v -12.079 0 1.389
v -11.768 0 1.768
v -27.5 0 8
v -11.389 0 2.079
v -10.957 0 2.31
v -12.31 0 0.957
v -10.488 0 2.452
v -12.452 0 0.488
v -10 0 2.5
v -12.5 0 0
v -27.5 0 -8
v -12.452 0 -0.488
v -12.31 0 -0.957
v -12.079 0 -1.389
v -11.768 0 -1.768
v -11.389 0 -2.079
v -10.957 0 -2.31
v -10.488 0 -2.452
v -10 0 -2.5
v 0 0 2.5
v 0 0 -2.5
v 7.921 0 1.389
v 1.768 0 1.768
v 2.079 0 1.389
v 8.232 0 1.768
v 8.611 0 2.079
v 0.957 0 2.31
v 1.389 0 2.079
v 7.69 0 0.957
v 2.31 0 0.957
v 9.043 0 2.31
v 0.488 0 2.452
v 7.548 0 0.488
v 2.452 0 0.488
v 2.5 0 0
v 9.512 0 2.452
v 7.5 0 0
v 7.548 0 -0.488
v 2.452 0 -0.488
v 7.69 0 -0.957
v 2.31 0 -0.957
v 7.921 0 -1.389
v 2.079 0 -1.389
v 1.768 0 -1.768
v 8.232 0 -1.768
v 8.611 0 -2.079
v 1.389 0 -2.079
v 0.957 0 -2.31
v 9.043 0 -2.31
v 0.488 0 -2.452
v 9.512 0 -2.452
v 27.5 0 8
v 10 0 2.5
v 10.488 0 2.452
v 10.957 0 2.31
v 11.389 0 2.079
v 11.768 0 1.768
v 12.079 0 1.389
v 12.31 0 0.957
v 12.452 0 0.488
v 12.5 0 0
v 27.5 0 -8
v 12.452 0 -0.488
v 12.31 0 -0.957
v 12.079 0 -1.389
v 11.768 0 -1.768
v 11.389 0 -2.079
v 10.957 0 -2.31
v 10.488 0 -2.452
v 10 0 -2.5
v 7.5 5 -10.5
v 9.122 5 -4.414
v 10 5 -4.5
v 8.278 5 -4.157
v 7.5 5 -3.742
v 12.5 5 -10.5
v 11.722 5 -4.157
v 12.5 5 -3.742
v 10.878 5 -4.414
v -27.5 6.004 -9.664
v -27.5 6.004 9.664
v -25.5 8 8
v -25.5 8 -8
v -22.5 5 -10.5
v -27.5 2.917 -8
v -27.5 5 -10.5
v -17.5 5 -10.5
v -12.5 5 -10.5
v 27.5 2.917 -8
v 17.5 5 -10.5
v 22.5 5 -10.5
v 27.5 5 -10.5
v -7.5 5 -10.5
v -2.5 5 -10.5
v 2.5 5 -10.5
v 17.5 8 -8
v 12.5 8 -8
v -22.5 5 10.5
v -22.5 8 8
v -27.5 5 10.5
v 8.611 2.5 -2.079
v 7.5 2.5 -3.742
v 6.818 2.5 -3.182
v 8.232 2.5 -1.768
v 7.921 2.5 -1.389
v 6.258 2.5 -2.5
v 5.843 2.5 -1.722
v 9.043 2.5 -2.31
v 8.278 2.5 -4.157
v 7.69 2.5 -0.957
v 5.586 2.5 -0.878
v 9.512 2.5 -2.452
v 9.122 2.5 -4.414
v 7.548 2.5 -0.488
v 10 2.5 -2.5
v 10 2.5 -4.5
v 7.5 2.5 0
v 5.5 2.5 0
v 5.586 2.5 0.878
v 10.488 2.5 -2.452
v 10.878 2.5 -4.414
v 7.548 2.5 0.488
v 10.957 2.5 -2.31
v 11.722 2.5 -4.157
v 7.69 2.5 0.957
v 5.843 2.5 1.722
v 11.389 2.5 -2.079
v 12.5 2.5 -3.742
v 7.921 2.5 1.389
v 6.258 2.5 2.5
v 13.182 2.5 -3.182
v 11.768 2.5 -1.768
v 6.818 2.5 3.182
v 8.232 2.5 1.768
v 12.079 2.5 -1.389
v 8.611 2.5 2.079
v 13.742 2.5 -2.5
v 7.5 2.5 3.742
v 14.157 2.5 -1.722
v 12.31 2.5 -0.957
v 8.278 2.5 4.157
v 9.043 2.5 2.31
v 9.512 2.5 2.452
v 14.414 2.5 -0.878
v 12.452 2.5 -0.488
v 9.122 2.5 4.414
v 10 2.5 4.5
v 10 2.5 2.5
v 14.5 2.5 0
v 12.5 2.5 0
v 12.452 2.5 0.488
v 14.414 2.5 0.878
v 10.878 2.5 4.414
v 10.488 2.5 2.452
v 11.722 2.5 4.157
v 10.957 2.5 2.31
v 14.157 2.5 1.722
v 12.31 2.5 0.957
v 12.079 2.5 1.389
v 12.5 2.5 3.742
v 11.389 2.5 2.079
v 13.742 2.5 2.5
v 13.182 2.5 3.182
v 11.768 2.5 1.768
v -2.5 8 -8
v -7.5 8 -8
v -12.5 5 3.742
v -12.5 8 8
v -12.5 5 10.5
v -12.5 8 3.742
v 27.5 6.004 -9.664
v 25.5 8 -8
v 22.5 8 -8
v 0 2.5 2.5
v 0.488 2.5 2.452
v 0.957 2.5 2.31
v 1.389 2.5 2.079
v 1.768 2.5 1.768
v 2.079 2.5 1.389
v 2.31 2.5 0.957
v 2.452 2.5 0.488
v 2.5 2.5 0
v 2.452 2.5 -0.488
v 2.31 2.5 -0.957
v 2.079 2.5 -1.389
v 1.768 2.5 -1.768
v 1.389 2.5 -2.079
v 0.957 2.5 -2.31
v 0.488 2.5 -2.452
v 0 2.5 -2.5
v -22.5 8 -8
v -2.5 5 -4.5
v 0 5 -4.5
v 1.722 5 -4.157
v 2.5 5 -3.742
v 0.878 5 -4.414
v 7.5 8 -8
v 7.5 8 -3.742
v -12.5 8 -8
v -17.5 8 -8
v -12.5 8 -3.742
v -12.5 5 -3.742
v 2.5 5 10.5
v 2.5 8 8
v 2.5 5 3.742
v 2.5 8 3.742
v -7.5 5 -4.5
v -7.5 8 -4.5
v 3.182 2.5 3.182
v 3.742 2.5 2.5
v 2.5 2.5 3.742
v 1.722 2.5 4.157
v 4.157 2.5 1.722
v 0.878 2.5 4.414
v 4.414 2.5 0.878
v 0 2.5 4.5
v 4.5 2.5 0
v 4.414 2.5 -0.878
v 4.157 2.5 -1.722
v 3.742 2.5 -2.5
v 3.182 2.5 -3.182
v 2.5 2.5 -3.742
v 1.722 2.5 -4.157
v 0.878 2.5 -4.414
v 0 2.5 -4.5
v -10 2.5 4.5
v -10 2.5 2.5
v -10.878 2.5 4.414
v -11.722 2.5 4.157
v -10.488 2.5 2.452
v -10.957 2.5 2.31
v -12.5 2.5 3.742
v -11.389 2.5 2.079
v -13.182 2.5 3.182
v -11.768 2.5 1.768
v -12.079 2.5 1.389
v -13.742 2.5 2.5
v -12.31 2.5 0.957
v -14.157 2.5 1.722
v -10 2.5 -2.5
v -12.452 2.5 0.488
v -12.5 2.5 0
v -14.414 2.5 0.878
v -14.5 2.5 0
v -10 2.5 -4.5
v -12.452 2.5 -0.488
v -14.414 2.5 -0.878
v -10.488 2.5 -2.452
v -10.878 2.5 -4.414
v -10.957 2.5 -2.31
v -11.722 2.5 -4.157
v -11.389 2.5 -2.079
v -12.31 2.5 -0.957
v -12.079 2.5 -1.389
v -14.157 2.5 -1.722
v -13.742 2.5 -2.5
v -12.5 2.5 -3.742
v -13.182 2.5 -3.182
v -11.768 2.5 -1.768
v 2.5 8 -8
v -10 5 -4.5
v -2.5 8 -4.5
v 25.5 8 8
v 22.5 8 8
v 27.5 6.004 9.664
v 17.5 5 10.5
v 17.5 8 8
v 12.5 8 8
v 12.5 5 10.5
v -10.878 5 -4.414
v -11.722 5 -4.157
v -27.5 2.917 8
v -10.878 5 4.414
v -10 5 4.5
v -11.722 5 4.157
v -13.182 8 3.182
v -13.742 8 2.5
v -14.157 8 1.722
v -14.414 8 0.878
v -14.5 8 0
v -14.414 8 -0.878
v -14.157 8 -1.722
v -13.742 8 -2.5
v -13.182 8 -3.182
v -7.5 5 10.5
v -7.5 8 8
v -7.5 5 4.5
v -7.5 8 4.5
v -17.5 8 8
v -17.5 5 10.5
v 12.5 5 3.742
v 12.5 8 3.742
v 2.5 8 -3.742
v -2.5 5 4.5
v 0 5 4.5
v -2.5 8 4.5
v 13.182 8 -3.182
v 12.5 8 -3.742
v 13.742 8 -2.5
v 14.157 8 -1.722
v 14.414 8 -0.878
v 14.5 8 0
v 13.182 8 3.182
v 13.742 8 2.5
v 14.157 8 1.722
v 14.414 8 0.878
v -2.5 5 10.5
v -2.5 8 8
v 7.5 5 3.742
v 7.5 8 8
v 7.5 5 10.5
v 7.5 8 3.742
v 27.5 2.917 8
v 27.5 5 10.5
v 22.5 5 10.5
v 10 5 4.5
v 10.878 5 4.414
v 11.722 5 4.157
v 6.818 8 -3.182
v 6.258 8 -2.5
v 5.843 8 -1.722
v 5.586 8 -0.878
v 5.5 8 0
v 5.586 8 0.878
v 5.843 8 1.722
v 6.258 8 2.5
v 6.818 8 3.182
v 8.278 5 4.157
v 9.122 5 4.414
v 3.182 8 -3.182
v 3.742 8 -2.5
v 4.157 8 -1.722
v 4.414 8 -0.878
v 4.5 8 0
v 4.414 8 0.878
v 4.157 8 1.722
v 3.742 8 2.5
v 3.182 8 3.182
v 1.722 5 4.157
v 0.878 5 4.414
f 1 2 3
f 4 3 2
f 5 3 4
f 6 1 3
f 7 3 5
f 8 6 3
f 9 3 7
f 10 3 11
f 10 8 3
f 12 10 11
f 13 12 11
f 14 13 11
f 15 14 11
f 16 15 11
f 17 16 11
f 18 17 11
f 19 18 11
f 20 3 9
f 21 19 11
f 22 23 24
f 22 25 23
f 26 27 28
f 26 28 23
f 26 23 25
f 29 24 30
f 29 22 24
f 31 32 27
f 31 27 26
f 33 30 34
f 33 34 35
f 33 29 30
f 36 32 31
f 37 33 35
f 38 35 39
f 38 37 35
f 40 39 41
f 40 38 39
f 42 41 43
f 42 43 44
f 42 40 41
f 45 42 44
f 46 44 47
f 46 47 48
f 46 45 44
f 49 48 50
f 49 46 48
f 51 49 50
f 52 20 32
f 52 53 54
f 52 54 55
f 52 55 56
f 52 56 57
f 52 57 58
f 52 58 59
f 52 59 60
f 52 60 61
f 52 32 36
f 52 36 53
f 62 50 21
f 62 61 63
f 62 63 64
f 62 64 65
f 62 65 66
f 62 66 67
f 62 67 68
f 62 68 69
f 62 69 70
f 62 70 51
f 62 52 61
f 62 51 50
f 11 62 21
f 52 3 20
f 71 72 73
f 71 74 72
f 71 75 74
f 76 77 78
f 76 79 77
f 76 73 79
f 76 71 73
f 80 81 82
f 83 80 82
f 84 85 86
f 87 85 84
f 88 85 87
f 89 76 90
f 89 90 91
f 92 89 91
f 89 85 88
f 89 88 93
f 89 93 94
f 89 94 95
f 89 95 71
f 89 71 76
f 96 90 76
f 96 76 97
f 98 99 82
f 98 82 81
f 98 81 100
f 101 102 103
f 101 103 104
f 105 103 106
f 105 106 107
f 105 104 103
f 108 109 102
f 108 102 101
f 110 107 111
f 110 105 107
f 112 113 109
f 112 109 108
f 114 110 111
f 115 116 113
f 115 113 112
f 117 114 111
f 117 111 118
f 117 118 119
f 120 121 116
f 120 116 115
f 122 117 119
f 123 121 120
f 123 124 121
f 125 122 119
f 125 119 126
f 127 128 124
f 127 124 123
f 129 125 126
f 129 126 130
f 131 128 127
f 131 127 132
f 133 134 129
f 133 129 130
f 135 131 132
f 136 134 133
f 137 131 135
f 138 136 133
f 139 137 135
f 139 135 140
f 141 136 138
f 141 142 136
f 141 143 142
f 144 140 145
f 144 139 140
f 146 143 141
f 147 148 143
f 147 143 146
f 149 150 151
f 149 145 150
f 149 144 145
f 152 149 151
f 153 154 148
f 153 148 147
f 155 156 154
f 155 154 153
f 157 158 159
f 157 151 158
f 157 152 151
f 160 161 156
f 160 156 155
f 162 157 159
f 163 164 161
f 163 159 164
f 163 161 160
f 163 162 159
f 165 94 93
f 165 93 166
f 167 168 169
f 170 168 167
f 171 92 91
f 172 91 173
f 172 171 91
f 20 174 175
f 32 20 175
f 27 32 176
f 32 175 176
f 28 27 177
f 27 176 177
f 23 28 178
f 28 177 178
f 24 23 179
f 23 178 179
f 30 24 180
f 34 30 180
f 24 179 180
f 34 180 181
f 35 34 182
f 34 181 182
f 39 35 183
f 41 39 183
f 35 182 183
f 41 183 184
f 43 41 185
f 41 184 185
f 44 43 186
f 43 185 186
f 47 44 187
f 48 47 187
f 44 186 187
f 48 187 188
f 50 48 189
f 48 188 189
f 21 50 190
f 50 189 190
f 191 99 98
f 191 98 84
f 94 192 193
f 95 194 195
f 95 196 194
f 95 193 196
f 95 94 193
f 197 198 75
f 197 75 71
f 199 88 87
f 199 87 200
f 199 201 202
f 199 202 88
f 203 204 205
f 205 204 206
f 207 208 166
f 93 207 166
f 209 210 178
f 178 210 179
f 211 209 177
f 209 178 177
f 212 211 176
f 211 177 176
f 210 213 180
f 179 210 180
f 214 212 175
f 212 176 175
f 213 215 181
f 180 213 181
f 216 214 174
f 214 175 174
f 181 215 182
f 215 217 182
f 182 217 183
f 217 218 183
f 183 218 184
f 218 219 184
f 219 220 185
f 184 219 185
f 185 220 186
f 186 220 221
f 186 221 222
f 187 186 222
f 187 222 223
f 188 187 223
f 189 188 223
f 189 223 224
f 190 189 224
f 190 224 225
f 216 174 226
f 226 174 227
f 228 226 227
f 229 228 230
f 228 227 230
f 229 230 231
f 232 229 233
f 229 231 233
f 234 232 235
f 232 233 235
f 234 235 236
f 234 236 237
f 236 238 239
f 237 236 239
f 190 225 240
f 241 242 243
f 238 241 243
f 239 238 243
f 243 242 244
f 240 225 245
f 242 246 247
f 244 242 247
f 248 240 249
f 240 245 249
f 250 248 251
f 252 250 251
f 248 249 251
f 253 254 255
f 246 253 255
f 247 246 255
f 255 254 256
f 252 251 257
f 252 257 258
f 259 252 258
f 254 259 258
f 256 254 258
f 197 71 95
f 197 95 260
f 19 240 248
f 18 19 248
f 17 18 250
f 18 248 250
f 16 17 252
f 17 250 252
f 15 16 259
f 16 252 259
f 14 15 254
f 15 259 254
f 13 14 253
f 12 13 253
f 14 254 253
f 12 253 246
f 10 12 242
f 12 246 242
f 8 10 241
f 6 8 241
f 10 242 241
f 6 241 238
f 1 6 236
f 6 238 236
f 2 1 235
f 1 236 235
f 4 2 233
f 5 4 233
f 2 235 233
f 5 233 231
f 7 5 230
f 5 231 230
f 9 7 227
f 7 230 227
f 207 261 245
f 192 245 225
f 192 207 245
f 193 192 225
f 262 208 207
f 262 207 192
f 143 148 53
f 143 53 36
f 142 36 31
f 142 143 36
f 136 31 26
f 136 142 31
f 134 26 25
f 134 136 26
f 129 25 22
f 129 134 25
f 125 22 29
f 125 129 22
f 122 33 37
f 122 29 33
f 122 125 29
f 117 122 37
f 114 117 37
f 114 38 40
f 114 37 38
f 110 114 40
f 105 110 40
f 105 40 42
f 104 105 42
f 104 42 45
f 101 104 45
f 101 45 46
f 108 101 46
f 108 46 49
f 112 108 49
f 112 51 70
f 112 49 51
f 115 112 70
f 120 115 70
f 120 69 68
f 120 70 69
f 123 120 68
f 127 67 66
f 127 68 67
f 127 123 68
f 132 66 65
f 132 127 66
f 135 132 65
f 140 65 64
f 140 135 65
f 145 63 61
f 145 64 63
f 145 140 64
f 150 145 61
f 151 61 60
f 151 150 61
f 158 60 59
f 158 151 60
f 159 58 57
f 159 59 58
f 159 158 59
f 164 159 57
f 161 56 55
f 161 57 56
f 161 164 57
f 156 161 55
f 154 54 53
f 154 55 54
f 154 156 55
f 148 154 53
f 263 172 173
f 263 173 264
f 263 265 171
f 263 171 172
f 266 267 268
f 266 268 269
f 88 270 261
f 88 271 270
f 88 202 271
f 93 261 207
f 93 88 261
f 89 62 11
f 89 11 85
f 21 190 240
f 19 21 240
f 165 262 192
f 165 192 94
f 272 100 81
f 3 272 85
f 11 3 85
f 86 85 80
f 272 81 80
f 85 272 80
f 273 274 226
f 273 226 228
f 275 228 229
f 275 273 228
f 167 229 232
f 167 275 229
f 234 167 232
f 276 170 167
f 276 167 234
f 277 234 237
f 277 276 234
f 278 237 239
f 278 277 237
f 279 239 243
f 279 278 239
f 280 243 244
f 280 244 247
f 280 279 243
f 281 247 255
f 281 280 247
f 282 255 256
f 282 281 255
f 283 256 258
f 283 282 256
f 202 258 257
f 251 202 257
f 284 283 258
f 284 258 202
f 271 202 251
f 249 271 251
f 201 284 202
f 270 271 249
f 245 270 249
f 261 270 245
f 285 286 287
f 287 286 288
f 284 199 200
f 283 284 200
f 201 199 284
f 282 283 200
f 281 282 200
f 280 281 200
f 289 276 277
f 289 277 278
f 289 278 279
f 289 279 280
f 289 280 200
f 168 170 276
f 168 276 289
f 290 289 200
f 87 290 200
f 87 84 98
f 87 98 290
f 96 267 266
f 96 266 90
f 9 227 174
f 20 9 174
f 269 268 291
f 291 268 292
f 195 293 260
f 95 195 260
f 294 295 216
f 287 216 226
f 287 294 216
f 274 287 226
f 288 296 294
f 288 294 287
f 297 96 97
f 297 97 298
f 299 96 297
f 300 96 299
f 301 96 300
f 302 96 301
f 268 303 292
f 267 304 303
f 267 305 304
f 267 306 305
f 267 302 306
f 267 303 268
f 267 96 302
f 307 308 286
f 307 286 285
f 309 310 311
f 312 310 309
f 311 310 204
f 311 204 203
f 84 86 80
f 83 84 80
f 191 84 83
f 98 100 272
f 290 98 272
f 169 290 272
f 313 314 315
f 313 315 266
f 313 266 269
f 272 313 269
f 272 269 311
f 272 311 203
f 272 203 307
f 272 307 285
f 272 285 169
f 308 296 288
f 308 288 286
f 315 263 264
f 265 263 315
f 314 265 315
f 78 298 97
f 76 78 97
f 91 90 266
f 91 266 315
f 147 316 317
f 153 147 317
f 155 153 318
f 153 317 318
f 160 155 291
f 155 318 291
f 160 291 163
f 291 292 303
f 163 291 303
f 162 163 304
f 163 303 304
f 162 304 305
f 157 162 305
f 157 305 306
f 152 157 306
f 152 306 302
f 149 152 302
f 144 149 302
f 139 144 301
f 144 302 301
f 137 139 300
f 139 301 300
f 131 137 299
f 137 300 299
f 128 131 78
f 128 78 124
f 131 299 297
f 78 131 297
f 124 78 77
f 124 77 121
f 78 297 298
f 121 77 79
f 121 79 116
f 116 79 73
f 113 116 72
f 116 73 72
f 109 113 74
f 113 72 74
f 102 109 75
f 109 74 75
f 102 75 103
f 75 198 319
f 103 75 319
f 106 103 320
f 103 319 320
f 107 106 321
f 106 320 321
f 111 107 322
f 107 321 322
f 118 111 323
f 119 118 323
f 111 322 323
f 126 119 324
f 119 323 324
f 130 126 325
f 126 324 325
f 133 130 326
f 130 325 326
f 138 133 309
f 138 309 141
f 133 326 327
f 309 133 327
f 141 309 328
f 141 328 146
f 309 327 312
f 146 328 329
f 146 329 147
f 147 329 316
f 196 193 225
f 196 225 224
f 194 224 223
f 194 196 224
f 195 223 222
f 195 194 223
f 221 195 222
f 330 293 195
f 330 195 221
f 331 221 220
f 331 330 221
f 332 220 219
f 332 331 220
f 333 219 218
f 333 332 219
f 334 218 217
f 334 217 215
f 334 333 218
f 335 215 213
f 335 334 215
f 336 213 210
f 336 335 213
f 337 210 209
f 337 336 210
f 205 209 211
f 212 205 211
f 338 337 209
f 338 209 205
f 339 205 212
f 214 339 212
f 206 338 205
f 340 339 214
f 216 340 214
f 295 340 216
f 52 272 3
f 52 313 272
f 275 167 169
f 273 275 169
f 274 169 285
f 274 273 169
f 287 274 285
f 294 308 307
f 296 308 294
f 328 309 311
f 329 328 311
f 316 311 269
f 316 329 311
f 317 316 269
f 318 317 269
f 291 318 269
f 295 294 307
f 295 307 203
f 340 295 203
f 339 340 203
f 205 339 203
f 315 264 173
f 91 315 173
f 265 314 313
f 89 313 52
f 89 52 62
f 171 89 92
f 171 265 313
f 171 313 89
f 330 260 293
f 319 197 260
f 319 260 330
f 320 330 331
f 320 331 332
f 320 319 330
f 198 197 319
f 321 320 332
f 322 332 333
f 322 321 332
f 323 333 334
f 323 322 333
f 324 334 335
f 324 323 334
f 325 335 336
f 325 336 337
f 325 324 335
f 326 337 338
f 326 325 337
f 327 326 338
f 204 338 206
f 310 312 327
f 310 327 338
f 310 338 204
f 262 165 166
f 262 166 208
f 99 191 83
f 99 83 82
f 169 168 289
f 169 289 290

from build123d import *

# Parameters (mm, degrees)
EXTRUDE_1_DEPTH                  = 27.5
SKETCH_2_W                       = 5
SKETCH_2_H                       = 21
CUT_EXTRUDE_1_DEPTH              = 3
PATTERN_LINEAR_1_COUNT           = 3
PATTERN_LINEAR_1_PITCH           = 10
PATTERN_LINEAR_2_COPY_1_SKETCH_W = 5
PATTERN_LINEAR_2_COPY_1_SKETCH_H = 21
PATTERN_LINEAR_2_COPY_1_DEPTH    = 3
PATTERN_LINEAR_2_COPY_2_SKETCH_W = 5
PATTERN_LINEAR_2_COPY_2_SKETCH_H = 21
PATTERN_LINEAR_2_COPY_2_DEPTH    = 3
PATTERN_LINEAR_2_COPY_3_SKETCH_W = 5
PATTERN_LINEAR_2_COPY_3_SKETCH_H = 21
PATTERN_LINEAR_2_COPY_3_DEPTH    = 3
PATTERN_LINEAR_2_COPY_4_SKETCH_W = 5
PATTERN_LINEAR_2_COPY_4_SKETCH_H = 21
PATTERN_LINEAR_2_COPY_4_DEPTH    = 3
PATTERN_LINEAR_2_COPY_5_SKETCH_W = 5
PATTERN_LINEAR_2_COPY_5_SKETCH_H = 21
PATTERN_LINEAR_2_COPY_5_DEPTH    = 3
PATTERN_LINEAR_2_COPY_6_SKETCH_W = 5
PATTERN_LINEAR_2_COPY_6_SKETCH_H = 21
PATTERN_LINEAR_2_COPY_6_DEPTH    = 3
CUT_EXTRUDE_2_DEPTH              = 31.504098085
CUT_EXTRUDE_2_DEPTH_BACK         = 55
SKETCH_3_R                       = 2.5
CUT_EXTRUDE_3_DEPTH              = 31.504098085
SKETCH_5_R                       = 4.5
CUT_EXTRUDE_4_DEPTH              = 5.5


with BuildPart() as part:
    # 草图1 → 凸台-拉伸1 (new, symmetric)
    with BuildSketch(Plane(origin=(0, 0, 0), x_dir=(0, 0, -1), z_dir=(1, 0, 0))):
        Polygon((-8, 0), (8, 0), (8, 2.916666667), (10.5, 5), (8, 8), (-8, 8), (-10.5, 5), (-8, 2.916666667), align=None)
    extrude(amount=EXTRUDE_1_DEPTH, both=True)

    # 草图2 → 切除-拉伸1 (cut)
    with BuildSketch(Plane(origin=(0, 8, 0), x_dir=(1, 0, 0), z_dir=(0, 1, 0))):
        Rectangle(SKETCH_2_W, SKETCH_2_H)
    cut_extrude_1 = extrude(amount=-CUT_EXTRUDE_1_DEPTH, mode=Mode.SUBTRACT)

    # 阵列(线性)1: 切除-拉伸1 ×3
    with Locations(*[(i * PATTERN_LINEAR_1_PITCH, 0, 0) for i in range(1, PATTERN_LINEAR_1_COUNT)]):
        add(cut_extrude_1, mode=Mode.SUBTRACT)

    # 阵列(线性)2 copy 1 sketch → 阵列(线性)2 copy 1 (cut)
    with BuildSketch(Plane(origin=(0, 8, 0), x_dir=(1, 0, 0), z_dir=(0, 1, 0))):
        Rectangle(PATTERN_LINEAR_2_COPY_1_SKETCH_W, PATTERN_LINEAR_2_COPY_1_SKETCH_H)
    extrude(amount=-PATTERN_LINEAR_2_COPY_1_DEPTH, mode=Mode.SUBTRACT)

    # 阵列(线性)2 copy 2 sketch → 阵列(线性)2 copy 2 (cut)
    with BuildSketch(Plane(origin=(-10, 8, 0), x_dir=(1, 0, 0), z_dir=(0, 1, 0))):
        Rectangle(PATTERN_LINEAR_2_COPY_2_SKETCH_W, PATTERN_LINEAR_2_COPY_2_SKETCH_H)
    extrude(amount=-PATTERN_LINEAR_2_COPY_2_DEPTH, mode=Mode.SUBTRACT)

    # 阵列(线性)2 copy 3 sketch → 阵列(线性)2 copy 3 (cut)
    with BuildSketch(Plane(origin=(10, 8, 0), x_dir=(1, 0, 0), z_dir=(0, 1, 0))):
        Rectangle(PATTERN_LINEAR_2_COPY_3_SKETCH_W, PATTERN_LINEAR_2_COPY_3_SKETCH_H)
    extrude(amount=-PATTERN_LINEAR_2_COPY_3_DEPTH, mode=Mode.SUBTRACT)

    # 阵列(线性)2 copy 4 sketch → 阵列(线性)2 copy 4 (cut)
    with BuildSketch(Plane(origin=(0, 8, 0), x_dir=(1, 0, 0), z_dir=(0, 1, 0))):
        Rectangle(PATTERN_LINEAR_2_COPY_4_SKETCH_W, PATTERN_LINEAR_2_COPY_4_SKETCH_H)
    extrude(amount=-PATTERN_LINEAR_2_COPY_4_DEPTH, mode=Mode.SUBTRACT)

    # 阵列(线性)2 copy 5 sketch → 阵列(线性)2 copy 5 (cut)
    with BuildSketch(Plane(origin=(-10, 8, 0), x_dir=(1, 0, 0), z_dir=(0, 1, 0))):
        Rectangle(PATTERN_LINEAR_2_COPY_5_SKETCH_W, PATTERN_LINEAR_2_COPY_5_SKETCH_H)
    extrude(amount=-PATTERN_LINEAR_2_COPY_5_DEPTH, mode=Mode.SUBTRACT)

    # 阵列(线性)2 copy 6 sketch → 阵列(线性)2 copy 6 (cut)
    with BuildSketch(Plane(origin=(-20, 8, 0), x_dir=(1, 0, 0), z_dir=(0, 1, 0))):
        Rectangle(PATTERN_LINEAR_2_COPY_6_SKETCH_W, PATTERN_LINEAR_2_COPY_6_SKETCH_H)
    extrude(amount=-PATTERN_LINEAR_2_COPY_6_DEPTH, mode=Mode.SUBTRACT)

    # 草图3 → 切除-拉伸2 (cut, two sides: drawn at the far end of the back side and taken through both)
    with BuildSketch(Plane.XZ.offset(-CUT_EXTRUDE_2_DEPTH_BACK)):
        with Locations(Location((10, 0, 0), (0, 0, 90))):
            Circle(SKETCH_3_R)
        with BuildLine():
            Line((-10, 2.5), (0, 2.5))
            ThreePointArc((0, 2.5), (2.5, 0), (0, -2.5))
            Line((0, -2.5), (-10, -2.5))
            ThreePointArc((-10, -2.5), (-12.5, 0), (-10, 2.5))
        make_face()
    extrude(amount=CUT_EXTRUDE_2_DEPTH + CUT_EXTRUDE_2_DEPTH_BACK, mode=Mode.SUBTRACT)

    # 草图4 → 切除-拉伸3 (cut, symmetric)
    with BuildSketch(Plane.XY):
        Polygon((-27.5, 6.003638962), (-25.5, 8), (-27.5, 8), align=None)
    cut_extrude_3 = extrude(amount=CUT_EXTRUDE_3_DEPTH, both=True, mode=Mode.SUBTRACT)

    # 镜向1: 切除-拉伸3 across plane
    add(cut_extrude_3.mirror(Plane(origin=(0, 0, 0), x_dir=(0, 0, 1), z_dir=(1, 0, 0))), mode=Mode.SUBTRACT)

    # 草图5 → 切除-拉伸4 (cut)
    with BuildSketch(Plane(origin=(0, 8, 0), x_dir=(1, 0, 0), z_dir=(0, 1, 0))):
        with Locations(Location((10, 0, 0), (0, 0, 270))):
            Circle(SKETCH_5_R)
        with BuildLine():
            Line((-10, 4.5), (0, 4.5))
            ThreePointArc((0, 4.5), (4.5, 0), (0, -4.5))
            Line((0, -4.5), (-10, -4.5))
            ThreePointArc((-10, -4.5), (-14.5, 0), (-10, 4.5))
        make_face()
    extrude(amount=-CUT_EXTRUDE_4_DEPTH, mode=Mode.SUBTRACT)


solid = part.part
